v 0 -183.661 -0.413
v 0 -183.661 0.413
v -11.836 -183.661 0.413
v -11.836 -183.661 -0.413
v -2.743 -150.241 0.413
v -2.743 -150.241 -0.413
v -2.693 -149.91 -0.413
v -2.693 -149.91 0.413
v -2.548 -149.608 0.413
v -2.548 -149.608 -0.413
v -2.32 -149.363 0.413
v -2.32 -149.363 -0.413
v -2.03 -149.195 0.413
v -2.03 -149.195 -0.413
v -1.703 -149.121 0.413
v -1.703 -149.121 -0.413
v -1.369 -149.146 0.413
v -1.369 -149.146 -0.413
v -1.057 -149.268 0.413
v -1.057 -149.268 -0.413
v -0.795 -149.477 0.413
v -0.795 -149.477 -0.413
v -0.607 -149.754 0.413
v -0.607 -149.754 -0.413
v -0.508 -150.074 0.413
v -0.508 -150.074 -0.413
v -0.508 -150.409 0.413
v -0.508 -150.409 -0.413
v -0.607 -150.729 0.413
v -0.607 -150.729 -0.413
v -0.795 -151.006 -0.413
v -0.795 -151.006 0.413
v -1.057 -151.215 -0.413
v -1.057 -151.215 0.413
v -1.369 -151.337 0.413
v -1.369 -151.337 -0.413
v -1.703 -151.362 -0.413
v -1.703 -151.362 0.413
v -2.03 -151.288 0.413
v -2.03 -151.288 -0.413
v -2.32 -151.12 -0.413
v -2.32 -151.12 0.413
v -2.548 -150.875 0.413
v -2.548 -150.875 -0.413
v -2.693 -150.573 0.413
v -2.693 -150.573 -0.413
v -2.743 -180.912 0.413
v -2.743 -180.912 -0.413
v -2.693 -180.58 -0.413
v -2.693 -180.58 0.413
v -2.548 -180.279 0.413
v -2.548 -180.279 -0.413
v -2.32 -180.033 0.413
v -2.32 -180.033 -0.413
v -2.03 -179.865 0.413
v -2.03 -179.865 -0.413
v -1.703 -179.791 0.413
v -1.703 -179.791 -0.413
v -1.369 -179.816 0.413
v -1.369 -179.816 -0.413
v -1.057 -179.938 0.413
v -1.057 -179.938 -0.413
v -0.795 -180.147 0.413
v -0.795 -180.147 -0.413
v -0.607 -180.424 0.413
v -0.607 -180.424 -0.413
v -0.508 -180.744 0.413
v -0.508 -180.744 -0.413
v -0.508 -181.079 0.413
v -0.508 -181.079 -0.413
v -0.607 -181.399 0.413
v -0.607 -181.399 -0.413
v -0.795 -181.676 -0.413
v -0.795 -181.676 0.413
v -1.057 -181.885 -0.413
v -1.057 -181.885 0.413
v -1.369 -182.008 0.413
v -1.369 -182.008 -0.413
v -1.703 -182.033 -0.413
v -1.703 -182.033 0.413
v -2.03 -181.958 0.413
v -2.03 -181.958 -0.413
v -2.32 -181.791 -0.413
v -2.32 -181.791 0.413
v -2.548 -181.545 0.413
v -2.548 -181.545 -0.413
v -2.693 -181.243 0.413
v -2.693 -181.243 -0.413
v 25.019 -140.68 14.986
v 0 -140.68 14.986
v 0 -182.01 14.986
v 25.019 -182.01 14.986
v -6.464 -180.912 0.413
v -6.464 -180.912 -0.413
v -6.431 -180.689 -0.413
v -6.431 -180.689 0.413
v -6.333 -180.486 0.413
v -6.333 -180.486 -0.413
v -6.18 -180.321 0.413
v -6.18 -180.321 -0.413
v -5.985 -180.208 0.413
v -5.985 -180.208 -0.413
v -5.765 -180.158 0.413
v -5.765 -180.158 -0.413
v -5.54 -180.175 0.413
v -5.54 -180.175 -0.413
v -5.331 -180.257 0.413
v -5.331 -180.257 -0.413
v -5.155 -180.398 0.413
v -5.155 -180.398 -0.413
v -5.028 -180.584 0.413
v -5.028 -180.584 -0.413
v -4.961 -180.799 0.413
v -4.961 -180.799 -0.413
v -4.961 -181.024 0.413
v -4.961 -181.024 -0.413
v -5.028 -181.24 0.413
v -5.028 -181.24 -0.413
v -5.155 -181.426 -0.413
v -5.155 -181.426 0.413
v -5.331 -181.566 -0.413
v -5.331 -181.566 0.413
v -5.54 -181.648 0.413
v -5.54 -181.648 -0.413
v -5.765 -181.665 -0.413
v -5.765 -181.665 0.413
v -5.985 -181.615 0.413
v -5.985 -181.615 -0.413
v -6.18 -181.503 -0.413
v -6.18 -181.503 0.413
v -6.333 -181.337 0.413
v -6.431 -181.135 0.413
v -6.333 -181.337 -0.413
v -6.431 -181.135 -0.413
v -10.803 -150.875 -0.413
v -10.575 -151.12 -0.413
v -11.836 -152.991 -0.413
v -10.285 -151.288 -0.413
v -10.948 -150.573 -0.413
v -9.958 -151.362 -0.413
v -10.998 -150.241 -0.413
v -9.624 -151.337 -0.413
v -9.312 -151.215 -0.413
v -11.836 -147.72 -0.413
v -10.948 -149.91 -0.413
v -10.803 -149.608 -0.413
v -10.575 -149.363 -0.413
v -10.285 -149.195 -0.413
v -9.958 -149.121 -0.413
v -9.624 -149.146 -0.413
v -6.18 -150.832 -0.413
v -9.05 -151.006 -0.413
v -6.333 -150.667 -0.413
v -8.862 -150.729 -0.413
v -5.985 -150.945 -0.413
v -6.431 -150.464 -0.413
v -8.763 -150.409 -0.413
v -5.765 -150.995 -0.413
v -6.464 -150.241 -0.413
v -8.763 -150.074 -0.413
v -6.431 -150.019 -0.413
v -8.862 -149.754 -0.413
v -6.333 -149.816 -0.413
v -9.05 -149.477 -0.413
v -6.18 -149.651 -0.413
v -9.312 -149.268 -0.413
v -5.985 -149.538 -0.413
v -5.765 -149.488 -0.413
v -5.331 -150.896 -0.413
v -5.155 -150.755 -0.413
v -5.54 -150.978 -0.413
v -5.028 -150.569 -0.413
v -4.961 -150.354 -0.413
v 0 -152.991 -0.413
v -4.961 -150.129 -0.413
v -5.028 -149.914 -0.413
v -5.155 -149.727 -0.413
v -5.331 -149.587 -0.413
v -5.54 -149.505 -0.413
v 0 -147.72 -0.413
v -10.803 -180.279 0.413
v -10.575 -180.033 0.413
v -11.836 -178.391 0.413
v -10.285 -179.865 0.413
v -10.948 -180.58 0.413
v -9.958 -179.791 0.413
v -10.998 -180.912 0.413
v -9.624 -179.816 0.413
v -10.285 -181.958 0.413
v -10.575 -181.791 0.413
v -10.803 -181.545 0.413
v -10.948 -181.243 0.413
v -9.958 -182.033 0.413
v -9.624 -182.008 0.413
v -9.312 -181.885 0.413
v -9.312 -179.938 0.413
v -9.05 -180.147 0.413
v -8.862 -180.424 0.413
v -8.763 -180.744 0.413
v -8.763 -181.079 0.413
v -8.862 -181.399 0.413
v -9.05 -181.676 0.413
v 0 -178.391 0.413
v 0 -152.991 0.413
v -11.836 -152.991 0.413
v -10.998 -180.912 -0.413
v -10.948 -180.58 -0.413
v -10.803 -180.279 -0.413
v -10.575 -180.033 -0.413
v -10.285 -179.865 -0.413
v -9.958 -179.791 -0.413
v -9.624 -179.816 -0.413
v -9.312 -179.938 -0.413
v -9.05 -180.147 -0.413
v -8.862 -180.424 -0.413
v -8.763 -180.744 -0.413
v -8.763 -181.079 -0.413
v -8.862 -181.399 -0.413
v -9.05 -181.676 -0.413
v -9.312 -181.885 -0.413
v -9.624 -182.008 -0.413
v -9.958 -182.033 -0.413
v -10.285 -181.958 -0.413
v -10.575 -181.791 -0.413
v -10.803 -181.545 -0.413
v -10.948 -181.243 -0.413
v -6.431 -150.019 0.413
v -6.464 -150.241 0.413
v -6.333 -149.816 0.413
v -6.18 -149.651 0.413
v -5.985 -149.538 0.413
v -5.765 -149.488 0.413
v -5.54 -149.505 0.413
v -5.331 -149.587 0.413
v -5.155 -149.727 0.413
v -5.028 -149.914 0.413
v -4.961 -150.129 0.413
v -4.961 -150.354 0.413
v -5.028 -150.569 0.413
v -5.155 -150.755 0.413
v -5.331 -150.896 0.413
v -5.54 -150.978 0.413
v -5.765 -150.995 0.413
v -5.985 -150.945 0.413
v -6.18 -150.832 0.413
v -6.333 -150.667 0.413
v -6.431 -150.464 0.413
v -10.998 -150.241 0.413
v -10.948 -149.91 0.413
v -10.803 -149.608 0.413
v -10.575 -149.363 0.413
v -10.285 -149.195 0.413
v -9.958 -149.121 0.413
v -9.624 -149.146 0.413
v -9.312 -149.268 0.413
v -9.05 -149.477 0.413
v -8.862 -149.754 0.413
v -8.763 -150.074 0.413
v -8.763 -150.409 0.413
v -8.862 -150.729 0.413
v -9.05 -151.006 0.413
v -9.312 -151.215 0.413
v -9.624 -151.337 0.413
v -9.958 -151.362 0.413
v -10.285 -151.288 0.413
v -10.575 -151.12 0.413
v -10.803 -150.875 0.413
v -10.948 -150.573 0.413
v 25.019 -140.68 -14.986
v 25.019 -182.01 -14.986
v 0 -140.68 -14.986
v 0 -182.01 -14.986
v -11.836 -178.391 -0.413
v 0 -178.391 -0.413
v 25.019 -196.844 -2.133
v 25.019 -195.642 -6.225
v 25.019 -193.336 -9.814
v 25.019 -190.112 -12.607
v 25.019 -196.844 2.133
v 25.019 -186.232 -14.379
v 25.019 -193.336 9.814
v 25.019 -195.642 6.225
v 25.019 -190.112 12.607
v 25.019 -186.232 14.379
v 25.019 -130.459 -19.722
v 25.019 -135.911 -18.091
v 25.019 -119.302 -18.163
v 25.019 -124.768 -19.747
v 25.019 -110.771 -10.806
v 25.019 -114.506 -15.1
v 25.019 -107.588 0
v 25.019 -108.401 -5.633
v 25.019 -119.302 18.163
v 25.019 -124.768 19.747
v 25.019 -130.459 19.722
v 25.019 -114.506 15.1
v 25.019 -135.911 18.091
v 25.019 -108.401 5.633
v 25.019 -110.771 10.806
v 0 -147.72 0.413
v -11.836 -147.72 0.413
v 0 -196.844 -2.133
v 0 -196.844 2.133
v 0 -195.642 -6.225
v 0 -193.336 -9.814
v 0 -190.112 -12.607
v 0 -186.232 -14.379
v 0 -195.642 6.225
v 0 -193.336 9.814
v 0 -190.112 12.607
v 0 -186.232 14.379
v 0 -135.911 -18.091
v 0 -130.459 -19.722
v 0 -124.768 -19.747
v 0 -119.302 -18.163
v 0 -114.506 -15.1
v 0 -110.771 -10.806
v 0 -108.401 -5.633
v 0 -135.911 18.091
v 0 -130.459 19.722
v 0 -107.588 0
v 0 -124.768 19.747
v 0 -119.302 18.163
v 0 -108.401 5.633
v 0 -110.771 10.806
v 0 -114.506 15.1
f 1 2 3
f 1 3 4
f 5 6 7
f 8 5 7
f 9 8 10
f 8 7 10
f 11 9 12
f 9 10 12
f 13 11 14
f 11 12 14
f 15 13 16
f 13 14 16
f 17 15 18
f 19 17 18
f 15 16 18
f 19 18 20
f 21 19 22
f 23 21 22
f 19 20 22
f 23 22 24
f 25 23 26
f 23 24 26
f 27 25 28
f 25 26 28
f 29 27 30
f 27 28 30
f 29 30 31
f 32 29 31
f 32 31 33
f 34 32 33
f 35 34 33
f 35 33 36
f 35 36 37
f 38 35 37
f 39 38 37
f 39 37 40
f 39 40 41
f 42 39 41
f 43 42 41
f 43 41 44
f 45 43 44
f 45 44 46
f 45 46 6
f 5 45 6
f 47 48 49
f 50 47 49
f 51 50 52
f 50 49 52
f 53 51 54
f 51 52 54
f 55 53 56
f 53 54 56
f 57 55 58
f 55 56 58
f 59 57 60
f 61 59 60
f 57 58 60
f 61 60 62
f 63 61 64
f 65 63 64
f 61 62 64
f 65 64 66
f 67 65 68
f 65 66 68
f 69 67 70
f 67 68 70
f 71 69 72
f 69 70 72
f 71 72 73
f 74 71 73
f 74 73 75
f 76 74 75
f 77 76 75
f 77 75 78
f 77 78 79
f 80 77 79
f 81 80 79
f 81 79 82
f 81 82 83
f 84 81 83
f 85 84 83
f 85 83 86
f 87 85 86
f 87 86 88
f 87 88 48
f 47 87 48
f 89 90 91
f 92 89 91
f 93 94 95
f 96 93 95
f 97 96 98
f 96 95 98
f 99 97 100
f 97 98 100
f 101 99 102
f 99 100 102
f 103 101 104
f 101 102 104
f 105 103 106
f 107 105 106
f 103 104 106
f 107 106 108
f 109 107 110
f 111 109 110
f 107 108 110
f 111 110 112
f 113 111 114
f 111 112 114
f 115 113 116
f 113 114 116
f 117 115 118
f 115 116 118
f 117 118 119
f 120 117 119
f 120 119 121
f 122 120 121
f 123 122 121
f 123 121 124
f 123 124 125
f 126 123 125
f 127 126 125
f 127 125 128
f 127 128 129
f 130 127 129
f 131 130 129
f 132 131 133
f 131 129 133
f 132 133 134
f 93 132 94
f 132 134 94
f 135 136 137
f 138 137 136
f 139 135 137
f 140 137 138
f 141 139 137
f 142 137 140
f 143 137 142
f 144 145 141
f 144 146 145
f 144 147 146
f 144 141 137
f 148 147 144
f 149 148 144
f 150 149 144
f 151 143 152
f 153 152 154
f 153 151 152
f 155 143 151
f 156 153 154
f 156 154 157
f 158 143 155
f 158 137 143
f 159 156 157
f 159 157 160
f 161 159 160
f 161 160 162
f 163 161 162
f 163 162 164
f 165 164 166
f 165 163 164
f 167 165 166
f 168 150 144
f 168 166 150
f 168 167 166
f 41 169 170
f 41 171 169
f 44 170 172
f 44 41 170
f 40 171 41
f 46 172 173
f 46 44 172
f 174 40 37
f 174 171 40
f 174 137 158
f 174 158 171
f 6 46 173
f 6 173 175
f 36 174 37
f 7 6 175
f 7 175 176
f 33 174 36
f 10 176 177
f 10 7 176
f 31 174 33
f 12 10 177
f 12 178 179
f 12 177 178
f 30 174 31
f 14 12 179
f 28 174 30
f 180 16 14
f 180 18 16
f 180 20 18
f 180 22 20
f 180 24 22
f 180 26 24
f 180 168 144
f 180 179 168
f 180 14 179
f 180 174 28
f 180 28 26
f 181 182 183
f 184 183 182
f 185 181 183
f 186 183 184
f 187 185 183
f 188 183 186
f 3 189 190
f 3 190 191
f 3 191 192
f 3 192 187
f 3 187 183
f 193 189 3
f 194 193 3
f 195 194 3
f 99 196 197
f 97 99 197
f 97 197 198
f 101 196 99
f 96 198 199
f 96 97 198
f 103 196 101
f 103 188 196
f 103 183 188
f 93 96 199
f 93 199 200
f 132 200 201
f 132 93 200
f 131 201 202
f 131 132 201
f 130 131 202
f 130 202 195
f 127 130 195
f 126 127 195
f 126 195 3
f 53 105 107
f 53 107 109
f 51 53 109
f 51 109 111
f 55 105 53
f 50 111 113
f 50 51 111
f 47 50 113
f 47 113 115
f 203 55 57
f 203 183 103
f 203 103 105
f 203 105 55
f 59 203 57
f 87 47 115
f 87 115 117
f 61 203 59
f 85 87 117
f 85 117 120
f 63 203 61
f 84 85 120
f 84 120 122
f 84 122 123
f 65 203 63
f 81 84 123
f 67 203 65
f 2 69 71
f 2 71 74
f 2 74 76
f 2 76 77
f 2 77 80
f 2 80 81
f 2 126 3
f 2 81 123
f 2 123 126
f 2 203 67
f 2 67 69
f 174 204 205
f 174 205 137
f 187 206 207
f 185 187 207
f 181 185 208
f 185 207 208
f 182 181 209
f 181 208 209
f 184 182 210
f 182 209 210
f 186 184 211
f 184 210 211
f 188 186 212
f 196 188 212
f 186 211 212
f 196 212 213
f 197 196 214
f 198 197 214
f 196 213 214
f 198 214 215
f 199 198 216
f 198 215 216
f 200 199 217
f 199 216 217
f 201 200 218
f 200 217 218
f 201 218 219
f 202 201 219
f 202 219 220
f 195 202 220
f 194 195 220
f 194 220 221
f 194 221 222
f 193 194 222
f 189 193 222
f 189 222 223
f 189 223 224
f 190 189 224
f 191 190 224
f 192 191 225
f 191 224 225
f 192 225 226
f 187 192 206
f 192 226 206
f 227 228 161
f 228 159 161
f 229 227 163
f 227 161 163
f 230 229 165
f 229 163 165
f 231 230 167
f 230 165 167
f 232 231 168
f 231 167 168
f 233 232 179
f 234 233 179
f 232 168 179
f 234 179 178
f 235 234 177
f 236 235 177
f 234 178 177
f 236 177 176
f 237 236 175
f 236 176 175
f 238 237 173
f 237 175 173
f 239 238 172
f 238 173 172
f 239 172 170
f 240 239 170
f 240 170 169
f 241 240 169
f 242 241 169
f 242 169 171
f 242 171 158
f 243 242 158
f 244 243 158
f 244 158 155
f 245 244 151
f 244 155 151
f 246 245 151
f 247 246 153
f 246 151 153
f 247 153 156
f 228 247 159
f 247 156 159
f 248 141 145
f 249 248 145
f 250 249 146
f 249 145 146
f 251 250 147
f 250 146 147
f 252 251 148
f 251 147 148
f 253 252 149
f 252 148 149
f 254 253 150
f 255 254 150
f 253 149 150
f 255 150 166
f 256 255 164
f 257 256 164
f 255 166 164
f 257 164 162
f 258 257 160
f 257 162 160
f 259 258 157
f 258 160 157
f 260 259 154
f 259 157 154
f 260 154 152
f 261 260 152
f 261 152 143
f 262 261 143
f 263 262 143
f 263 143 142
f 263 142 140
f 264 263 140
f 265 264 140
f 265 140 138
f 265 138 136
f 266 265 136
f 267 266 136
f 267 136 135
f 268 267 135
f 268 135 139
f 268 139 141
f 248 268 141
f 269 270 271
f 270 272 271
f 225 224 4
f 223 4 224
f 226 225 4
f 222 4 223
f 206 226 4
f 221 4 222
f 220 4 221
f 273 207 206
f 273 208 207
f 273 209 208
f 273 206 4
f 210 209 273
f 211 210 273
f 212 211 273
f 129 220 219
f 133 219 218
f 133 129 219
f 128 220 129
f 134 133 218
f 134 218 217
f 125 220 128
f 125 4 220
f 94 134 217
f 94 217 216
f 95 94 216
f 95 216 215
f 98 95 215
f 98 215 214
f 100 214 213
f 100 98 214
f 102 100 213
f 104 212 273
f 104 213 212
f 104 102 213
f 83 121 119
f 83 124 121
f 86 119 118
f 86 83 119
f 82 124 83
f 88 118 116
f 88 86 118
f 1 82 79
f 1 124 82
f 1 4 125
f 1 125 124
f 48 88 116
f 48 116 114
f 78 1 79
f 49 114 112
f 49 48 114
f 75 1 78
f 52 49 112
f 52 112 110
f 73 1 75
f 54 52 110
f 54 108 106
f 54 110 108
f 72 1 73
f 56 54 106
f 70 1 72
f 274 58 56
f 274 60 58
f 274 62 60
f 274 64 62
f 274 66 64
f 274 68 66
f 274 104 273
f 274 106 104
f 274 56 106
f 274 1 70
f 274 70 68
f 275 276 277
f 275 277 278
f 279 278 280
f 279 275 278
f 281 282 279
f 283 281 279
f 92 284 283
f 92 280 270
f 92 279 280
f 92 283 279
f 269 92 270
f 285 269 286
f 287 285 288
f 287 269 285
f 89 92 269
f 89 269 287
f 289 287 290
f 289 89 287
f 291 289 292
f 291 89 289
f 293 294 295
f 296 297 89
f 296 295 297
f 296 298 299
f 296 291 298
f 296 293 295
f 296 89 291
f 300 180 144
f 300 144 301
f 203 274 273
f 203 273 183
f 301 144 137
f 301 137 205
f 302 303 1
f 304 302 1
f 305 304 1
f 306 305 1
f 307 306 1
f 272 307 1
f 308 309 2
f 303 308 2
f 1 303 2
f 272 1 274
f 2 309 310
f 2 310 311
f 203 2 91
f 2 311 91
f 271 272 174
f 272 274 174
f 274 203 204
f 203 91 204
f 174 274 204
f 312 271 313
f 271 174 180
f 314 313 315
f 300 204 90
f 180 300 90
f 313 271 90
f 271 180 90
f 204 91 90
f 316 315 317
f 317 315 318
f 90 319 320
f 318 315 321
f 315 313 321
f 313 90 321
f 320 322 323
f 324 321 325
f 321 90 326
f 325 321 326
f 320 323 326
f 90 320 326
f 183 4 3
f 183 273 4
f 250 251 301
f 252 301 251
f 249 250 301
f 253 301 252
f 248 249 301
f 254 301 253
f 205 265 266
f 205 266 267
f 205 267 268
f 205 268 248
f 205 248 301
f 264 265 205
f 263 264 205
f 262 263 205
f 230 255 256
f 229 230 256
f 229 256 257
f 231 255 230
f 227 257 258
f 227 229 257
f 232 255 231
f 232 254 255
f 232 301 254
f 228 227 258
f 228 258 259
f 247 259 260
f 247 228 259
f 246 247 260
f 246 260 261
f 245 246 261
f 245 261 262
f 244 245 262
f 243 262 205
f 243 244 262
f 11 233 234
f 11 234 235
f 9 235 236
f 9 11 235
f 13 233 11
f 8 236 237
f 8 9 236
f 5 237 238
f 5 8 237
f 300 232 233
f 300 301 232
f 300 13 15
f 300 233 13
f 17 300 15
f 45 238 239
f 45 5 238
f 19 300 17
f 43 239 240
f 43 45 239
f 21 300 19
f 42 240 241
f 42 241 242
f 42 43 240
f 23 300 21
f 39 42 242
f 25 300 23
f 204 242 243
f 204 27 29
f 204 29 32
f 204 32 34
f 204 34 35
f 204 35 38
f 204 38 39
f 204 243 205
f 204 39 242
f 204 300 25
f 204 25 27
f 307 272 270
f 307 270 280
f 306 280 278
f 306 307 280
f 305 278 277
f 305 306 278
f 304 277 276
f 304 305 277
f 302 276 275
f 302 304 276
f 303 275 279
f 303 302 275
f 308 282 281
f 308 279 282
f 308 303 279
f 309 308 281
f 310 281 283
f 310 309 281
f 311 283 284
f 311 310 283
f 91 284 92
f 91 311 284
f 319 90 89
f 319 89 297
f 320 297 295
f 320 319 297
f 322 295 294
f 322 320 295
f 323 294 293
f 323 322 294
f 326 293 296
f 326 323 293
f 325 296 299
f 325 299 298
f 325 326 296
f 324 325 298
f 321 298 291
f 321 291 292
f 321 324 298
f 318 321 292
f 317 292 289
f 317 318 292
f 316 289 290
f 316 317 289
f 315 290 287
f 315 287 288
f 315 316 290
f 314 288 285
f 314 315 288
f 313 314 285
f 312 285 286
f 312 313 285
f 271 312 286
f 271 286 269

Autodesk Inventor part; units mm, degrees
ref_plane "YZ Plane" through (0, 0, 0) normal (1, 0, 0) x (0, 1, 0)
ref_plane "XZ Plane" through (0, 0, 0) normal (0, 1, 0) x (-1, 0, 0)
ref_plane "XY Plane" through (0, 0, 0) normal (0, 0, 1) x (1, 0, 0)
sketch "Sketch1" plane through (0, 0, 0) normal (1, 0, 0) x (0, 1, 0)
  circle A0 centre (-127.5274, 0) radius 19.939
  line L0 (-73.0444, 0) -> (-182.0104, 0) construction
  line L1 (-140.6798, 14.986) -> (-182.0104, 14.986)
  line L2 (-182.0104, -14.986) -> (-140.6798, -14.986)
  arc A1 (-182.0104, 14.986) -> (-182.0104, -14.986) centre (-182.0104, 0) ccw
  point P0 (0, 0)
  dimension "d0" = 39.878
  dimension "d1" = 29.972
  dimension "d2" = 89.408
extrude "Extrusion1" add sketch "Sketch1" along normal blind 25.019
sketch "Sketch2" plane through (0, 0, 0) normal (-1, 0, 0) x (0, 0, 1)
  line L0 (0.4128, -183.6614) -> (-0.4127, -183.6614)
  line L1 (-0.4127, -183.6614) -> (-0.4127, -178.3909)
  line L2 (-0.4127, -178.3909) -> (0.4128, -178.3909)
  line L3 (0.4128, -178.3909) -> (0.4128, -183.6614)
  line L4 (0.4128, -183.6614) -> (-0.4127, -178.3909) construction
  line L5 (-0.4127, -183.6614) -> (0.4128, -178.3909) construction
  line L6 (0.4128, -152.9909) -> (-0.4127, -152.9909)
  line L7 (-0.4127, -152.9909) -> (-0.4127, -147.7204)
  line L8 (-0.4127, -147.7204) -> (0.4128, -147.7204)
  line L9 (0.4128, -147.7204) -> (0.4128, -152.9909)
  line L10 (0.4128, -152.9909) -> (-0.4127, -147.7204) construction
  line L11 (-0.4127, -152.9909) -> (0.4128, -147.7204) construction
  arc A0 (14.986, -140.6798) -> (-14.986, -140.6798) centre (0, -127.5274) ccw projected
  line L12 (-14.986, -182.0104) -> (-14.986, -140.6798) projected
  arc A1 (-14.986, -182.0104) -> (14.986, -182.0104) centre (0, -182.0104) ccw projected
  line L13 (14.986, -140.6798) -> (14.986, -182.0104) projected
  point P0 (0, 0)
  point P1 (0, -181.0262)
  point P2 (0, -150.3557)
  point P3 (0, -150.3557)
  point P4 (0, -181.0262)
  point P5 (0, -150.3557)
  dimension "d5" = 5.2705
  dimension "d6" = 0.8255
  dimension "d7" = 40.132
  dimension "d8" = 25.4
extrude "Extrusion2" add sketch "Sketch2" along normal blind 11.8364 contours L0 L1 L2 L3 | L6 L7 L8 L9
sketch "Sketch3" plane through (0, -183.6614, -0.4127) normal (0, 0, -1) x (-1, 0, 0)
  circle A0 centre (9.8742, 2.7496) radius 1.124
  circle A1 centre (1.6192, 2.7496) radius 1.124
  circle A2 centre (5.7086, 2.7496) radius 0.7556
  circle A3 centre (1.6192, 33.42) radius 1.124
  circle A4 centre (5.7086, 33.42) radius 0.7556
  circle A5 centre (9.8742, 33.42) radius 1.124
  line L0 (0, 0) -> (0, 5.2705) projected
  line L1 (0, 0) -> (11.8364, 0) projected
  line L2 (11.8364, 5.2705) -> (11.8364, 0) projected
  line L3 (0, 5.2705) -> (11.8364, 5.2705) projected
  line L4 (0, 30.6705) -> (0, 35.941) projected
  line L5 (0, 30.6705) -> (11.8364, 30.6705) projected
  line L6 (11.8364, 35.941) -> (11.8364, 30.6705) projected
  line L7 (0, 35.941) -> (11.8364, 35.941) projected
  point P0 (0, 183.6614)
  dimension "d11" = 2.2479
  dimension "d12" = 1.6256
  dimension "d13" = 1.6256
  dimension "d14" = 0.8382
  dimension "d15" = 1.5113
  dimension "d16" = 2.286
  dimension "d17" = 2.2479
  dimension "d18" = 2.2098
extrude "Extrusion3" cut sketch "Sketch3" against normal through all contours A0 | A1 | A2 | A3 | A4 | A5
equation "\"d13\" = d12"
equation "\"d17\" = d11"
properties part number "OtherCamera"
